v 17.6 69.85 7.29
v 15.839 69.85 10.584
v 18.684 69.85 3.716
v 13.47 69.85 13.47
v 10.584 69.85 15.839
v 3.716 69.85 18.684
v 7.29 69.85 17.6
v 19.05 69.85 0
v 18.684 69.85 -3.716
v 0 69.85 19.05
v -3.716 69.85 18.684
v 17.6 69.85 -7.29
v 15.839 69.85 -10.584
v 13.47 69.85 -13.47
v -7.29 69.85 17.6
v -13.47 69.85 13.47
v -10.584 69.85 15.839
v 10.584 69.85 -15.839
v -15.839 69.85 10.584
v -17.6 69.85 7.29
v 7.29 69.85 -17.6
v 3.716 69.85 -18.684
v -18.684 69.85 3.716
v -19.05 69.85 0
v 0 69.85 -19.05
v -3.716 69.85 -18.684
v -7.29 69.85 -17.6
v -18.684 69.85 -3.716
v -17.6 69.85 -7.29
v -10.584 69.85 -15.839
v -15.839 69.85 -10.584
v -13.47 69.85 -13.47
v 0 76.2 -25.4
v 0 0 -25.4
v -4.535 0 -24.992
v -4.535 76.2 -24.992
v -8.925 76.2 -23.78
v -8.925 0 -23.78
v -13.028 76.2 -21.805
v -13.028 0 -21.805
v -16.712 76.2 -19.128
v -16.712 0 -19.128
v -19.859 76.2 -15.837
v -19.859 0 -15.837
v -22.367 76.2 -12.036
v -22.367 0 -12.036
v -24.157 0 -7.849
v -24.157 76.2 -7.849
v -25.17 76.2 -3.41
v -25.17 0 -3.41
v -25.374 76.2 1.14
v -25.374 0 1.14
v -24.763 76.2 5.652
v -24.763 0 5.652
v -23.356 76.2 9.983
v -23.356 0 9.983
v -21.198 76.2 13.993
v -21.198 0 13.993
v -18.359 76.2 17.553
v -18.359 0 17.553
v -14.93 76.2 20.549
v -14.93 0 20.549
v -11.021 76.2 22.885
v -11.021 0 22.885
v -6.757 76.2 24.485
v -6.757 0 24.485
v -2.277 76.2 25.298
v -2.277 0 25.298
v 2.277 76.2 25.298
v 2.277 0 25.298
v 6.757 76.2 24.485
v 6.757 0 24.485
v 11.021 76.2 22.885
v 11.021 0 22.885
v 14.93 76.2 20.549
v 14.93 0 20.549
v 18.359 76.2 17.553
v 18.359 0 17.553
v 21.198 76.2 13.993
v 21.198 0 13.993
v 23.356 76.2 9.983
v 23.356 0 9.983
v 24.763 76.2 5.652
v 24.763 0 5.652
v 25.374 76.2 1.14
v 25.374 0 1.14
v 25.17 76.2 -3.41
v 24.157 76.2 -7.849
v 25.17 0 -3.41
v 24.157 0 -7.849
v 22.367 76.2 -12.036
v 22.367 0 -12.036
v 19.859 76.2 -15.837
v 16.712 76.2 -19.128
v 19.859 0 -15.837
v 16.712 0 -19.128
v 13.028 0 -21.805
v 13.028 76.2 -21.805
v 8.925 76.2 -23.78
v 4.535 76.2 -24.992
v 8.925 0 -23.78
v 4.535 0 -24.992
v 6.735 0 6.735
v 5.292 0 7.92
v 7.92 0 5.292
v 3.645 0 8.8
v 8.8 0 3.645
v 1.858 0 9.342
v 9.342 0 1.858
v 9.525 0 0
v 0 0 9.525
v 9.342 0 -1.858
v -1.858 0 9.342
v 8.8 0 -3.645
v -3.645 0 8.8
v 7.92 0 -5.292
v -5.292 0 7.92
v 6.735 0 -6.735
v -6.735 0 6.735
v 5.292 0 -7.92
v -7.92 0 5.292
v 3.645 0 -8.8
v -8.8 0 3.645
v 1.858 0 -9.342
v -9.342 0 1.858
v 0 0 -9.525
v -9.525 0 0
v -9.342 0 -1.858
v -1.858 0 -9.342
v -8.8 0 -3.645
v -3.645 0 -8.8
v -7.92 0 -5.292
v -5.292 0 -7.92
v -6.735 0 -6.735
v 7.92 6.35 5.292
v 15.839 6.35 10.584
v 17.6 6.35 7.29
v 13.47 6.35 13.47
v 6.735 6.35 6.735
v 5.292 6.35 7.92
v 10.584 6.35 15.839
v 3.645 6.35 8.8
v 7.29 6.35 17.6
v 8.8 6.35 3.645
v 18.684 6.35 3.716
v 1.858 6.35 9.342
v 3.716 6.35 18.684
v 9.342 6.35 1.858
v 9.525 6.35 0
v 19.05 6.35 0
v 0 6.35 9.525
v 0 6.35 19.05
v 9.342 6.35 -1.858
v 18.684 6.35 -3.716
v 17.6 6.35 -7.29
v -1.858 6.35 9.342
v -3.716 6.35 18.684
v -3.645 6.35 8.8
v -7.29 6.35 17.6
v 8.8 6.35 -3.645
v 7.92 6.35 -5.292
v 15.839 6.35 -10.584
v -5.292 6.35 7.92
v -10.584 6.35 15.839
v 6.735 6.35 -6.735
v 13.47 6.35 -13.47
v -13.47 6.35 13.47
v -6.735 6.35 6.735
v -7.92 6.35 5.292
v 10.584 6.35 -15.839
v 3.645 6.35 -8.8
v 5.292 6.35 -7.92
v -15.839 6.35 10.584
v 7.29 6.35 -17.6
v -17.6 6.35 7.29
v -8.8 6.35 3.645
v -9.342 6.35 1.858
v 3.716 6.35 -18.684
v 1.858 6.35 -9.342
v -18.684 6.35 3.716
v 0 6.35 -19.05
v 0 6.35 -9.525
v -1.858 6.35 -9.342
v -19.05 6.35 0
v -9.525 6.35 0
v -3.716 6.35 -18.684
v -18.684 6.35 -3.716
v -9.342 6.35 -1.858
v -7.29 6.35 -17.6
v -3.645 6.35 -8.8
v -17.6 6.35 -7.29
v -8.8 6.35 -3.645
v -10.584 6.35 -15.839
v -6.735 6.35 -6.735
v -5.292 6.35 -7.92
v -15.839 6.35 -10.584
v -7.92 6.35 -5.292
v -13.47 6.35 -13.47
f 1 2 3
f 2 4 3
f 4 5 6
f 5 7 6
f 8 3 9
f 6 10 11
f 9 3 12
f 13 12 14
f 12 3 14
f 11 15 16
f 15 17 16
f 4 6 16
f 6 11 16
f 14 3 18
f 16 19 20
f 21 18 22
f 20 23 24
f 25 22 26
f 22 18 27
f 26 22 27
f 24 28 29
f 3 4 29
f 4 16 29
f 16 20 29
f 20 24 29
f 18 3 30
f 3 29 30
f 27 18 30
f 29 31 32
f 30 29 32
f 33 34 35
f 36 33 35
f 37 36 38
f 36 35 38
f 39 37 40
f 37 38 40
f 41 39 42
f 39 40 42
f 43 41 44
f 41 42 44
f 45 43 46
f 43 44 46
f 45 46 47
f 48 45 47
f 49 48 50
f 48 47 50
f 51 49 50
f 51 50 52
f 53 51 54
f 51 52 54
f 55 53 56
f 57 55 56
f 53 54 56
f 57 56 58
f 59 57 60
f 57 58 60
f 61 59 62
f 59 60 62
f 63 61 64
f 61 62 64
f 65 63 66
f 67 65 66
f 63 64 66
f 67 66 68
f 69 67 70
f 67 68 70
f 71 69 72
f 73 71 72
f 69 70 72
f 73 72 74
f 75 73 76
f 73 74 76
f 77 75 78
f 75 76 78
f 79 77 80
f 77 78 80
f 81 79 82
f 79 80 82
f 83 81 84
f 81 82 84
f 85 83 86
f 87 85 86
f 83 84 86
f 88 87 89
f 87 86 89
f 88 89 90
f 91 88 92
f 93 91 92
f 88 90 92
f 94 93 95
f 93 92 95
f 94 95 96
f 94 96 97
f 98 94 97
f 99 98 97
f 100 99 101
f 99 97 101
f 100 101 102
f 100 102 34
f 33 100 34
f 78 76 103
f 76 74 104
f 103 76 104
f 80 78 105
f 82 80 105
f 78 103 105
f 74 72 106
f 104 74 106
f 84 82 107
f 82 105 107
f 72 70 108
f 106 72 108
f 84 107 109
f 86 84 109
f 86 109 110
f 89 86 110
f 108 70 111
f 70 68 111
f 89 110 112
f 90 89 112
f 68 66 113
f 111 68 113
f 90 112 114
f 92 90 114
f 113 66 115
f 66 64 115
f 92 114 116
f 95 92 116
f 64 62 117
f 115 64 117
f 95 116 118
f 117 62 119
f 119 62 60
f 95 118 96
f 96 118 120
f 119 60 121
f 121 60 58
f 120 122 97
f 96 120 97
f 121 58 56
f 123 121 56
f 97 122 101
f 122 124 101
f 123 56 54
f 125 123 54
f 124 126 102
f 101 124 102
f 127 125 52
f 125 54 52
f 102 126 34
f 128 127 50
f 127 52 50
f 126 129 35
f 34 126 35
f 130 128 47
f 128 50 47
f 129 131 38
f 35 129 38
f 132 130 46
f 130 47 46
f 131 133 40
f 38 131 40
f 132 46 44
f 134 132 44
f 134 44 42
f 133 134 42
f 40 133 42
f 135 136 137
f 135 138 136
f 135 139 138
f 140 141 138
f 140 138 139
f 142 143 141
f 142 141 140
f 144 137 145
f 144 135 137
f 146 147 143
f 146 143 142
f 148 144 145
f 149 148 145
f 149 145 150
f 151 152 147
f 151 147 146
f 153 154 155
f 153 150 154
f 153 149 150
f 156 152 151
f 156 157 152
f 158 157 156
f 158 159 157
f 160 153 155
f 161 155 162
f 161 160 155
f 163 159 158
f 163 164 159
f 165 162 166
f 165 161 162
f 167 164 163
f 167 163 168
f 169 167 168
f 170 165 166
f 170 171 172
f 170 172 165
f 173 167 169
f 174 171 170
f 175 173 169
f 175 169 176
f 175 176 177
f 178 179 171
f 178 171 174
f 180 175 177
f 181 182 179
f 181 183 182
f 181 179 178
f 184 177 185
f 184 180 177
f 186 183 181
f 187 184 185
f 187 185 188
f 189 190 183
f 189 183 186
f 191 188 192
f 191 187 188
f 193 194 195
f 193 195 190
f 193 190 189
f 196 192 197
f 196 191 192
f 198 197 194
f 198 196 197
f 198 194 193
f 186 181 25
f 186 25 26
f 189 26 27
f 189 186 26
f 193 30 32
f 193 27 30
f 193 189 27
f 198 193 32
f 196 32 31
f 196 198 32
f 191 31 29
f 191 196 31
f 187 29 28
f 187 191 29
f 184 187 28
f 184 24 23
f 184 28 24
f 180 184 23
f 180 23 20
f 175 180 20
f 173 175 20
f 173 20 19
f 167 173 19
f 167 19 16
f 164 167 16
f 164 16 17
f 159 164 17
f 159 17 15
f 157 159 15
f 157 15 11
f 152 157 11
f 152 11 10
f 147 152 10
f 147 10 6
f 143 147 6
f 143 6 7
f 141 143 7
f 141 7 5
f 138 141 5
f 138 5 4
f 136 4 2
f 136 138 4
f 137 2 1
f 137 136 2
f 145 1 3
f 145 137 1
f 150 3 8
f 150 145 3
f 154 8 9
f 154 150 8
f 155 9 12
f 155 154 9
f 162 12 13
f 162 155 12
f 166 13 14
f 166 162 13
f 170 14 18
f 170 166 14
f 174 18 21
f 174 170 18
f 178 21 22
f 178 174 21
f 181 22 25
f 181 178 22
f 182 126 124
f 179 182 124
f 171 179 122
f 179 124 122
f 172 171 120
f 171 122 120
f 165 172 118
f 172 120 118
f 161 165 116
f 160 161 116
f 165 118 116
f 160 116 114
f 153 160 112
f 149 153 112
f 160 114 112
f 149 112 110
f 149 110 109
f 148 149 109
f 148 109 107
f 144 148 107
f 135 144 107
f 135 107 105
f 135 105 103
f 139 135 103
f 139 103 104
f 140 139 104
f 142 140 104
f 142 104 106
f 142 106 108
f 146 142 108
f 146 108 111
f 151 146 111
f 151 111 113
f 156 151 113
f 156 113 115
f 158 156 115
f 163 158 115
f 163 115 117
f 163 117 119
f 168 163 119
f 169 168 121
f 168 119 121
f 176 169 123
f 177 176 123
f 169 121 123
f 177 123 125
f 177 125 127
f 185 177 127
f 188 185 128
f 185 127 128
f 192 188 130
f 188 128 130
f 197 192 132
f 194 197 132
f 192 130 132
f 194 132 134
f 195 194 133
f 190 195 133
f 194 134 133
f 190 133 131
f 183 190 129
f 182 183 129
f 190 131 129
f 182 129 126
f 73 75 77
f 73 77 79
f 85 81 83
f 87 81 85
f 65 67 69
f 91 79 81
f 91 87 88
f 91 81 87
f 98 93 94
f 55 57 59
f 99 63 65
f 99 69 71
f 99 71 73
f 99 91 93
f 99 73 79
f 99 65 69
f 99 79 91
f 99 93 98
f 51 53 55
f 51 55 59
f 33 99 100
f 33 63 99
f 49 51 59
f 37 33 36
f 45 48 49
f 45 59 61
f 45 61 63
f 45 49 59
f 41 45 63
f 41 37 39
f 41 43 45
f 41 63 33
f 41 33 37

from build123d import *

# Parameters (mm, degrees)
SKETCH1_R           = 25.4
BOSS_EXTRUDE1_DEPTH = 76.2
SHELL1_T            = 6.35
CUT_EXTRUDE1_REACH  = 86.242
SKETCH2_R           = 9.525


with BuildPart() as part:
    # Sketch1 → Boss-Extrude1 (new body)
    with BuildSketch(Plane(origin=(0, 0, 0), x_dir=(1, 0, 0), z_dir=(0, 1, 0))):
        with Locations(Location((0, 0, 0), (0, 0, 90))):
            Circle(SKETCH1_R)
    extrude(amount=BOSS_EXTRUDE1_DEPTH)

    # Shell1 (no face opened: a closed hollow body)
    add(offset(amount=-SHELL1_T, mode=Mode.PRIVATE), mode=Mode.SUBTRACT)

    # Sketch2 → Cut-Extrude1 (cut, up to next)
    with BuildSketch(Plane.XZ, mode=Mode.PRIVATE) as cut_extrude1_sk1:
        with Locations(Location((0, 0, 0), (0, 0, 270))):
            Circle(SKETCH2_R)
    cut_extrude1_tool1 = extrude(cut_extrude1_sk1.sketch, amount=-CUT_EXTRUDE1_REACH, mode=Mode.PRIVATE) & part.part
    add(cut_extrude1_tool1.solids().sort_by_distance((0, 0, 0))[0], mode=Mode.SUBTRACT)


solid = part.part
